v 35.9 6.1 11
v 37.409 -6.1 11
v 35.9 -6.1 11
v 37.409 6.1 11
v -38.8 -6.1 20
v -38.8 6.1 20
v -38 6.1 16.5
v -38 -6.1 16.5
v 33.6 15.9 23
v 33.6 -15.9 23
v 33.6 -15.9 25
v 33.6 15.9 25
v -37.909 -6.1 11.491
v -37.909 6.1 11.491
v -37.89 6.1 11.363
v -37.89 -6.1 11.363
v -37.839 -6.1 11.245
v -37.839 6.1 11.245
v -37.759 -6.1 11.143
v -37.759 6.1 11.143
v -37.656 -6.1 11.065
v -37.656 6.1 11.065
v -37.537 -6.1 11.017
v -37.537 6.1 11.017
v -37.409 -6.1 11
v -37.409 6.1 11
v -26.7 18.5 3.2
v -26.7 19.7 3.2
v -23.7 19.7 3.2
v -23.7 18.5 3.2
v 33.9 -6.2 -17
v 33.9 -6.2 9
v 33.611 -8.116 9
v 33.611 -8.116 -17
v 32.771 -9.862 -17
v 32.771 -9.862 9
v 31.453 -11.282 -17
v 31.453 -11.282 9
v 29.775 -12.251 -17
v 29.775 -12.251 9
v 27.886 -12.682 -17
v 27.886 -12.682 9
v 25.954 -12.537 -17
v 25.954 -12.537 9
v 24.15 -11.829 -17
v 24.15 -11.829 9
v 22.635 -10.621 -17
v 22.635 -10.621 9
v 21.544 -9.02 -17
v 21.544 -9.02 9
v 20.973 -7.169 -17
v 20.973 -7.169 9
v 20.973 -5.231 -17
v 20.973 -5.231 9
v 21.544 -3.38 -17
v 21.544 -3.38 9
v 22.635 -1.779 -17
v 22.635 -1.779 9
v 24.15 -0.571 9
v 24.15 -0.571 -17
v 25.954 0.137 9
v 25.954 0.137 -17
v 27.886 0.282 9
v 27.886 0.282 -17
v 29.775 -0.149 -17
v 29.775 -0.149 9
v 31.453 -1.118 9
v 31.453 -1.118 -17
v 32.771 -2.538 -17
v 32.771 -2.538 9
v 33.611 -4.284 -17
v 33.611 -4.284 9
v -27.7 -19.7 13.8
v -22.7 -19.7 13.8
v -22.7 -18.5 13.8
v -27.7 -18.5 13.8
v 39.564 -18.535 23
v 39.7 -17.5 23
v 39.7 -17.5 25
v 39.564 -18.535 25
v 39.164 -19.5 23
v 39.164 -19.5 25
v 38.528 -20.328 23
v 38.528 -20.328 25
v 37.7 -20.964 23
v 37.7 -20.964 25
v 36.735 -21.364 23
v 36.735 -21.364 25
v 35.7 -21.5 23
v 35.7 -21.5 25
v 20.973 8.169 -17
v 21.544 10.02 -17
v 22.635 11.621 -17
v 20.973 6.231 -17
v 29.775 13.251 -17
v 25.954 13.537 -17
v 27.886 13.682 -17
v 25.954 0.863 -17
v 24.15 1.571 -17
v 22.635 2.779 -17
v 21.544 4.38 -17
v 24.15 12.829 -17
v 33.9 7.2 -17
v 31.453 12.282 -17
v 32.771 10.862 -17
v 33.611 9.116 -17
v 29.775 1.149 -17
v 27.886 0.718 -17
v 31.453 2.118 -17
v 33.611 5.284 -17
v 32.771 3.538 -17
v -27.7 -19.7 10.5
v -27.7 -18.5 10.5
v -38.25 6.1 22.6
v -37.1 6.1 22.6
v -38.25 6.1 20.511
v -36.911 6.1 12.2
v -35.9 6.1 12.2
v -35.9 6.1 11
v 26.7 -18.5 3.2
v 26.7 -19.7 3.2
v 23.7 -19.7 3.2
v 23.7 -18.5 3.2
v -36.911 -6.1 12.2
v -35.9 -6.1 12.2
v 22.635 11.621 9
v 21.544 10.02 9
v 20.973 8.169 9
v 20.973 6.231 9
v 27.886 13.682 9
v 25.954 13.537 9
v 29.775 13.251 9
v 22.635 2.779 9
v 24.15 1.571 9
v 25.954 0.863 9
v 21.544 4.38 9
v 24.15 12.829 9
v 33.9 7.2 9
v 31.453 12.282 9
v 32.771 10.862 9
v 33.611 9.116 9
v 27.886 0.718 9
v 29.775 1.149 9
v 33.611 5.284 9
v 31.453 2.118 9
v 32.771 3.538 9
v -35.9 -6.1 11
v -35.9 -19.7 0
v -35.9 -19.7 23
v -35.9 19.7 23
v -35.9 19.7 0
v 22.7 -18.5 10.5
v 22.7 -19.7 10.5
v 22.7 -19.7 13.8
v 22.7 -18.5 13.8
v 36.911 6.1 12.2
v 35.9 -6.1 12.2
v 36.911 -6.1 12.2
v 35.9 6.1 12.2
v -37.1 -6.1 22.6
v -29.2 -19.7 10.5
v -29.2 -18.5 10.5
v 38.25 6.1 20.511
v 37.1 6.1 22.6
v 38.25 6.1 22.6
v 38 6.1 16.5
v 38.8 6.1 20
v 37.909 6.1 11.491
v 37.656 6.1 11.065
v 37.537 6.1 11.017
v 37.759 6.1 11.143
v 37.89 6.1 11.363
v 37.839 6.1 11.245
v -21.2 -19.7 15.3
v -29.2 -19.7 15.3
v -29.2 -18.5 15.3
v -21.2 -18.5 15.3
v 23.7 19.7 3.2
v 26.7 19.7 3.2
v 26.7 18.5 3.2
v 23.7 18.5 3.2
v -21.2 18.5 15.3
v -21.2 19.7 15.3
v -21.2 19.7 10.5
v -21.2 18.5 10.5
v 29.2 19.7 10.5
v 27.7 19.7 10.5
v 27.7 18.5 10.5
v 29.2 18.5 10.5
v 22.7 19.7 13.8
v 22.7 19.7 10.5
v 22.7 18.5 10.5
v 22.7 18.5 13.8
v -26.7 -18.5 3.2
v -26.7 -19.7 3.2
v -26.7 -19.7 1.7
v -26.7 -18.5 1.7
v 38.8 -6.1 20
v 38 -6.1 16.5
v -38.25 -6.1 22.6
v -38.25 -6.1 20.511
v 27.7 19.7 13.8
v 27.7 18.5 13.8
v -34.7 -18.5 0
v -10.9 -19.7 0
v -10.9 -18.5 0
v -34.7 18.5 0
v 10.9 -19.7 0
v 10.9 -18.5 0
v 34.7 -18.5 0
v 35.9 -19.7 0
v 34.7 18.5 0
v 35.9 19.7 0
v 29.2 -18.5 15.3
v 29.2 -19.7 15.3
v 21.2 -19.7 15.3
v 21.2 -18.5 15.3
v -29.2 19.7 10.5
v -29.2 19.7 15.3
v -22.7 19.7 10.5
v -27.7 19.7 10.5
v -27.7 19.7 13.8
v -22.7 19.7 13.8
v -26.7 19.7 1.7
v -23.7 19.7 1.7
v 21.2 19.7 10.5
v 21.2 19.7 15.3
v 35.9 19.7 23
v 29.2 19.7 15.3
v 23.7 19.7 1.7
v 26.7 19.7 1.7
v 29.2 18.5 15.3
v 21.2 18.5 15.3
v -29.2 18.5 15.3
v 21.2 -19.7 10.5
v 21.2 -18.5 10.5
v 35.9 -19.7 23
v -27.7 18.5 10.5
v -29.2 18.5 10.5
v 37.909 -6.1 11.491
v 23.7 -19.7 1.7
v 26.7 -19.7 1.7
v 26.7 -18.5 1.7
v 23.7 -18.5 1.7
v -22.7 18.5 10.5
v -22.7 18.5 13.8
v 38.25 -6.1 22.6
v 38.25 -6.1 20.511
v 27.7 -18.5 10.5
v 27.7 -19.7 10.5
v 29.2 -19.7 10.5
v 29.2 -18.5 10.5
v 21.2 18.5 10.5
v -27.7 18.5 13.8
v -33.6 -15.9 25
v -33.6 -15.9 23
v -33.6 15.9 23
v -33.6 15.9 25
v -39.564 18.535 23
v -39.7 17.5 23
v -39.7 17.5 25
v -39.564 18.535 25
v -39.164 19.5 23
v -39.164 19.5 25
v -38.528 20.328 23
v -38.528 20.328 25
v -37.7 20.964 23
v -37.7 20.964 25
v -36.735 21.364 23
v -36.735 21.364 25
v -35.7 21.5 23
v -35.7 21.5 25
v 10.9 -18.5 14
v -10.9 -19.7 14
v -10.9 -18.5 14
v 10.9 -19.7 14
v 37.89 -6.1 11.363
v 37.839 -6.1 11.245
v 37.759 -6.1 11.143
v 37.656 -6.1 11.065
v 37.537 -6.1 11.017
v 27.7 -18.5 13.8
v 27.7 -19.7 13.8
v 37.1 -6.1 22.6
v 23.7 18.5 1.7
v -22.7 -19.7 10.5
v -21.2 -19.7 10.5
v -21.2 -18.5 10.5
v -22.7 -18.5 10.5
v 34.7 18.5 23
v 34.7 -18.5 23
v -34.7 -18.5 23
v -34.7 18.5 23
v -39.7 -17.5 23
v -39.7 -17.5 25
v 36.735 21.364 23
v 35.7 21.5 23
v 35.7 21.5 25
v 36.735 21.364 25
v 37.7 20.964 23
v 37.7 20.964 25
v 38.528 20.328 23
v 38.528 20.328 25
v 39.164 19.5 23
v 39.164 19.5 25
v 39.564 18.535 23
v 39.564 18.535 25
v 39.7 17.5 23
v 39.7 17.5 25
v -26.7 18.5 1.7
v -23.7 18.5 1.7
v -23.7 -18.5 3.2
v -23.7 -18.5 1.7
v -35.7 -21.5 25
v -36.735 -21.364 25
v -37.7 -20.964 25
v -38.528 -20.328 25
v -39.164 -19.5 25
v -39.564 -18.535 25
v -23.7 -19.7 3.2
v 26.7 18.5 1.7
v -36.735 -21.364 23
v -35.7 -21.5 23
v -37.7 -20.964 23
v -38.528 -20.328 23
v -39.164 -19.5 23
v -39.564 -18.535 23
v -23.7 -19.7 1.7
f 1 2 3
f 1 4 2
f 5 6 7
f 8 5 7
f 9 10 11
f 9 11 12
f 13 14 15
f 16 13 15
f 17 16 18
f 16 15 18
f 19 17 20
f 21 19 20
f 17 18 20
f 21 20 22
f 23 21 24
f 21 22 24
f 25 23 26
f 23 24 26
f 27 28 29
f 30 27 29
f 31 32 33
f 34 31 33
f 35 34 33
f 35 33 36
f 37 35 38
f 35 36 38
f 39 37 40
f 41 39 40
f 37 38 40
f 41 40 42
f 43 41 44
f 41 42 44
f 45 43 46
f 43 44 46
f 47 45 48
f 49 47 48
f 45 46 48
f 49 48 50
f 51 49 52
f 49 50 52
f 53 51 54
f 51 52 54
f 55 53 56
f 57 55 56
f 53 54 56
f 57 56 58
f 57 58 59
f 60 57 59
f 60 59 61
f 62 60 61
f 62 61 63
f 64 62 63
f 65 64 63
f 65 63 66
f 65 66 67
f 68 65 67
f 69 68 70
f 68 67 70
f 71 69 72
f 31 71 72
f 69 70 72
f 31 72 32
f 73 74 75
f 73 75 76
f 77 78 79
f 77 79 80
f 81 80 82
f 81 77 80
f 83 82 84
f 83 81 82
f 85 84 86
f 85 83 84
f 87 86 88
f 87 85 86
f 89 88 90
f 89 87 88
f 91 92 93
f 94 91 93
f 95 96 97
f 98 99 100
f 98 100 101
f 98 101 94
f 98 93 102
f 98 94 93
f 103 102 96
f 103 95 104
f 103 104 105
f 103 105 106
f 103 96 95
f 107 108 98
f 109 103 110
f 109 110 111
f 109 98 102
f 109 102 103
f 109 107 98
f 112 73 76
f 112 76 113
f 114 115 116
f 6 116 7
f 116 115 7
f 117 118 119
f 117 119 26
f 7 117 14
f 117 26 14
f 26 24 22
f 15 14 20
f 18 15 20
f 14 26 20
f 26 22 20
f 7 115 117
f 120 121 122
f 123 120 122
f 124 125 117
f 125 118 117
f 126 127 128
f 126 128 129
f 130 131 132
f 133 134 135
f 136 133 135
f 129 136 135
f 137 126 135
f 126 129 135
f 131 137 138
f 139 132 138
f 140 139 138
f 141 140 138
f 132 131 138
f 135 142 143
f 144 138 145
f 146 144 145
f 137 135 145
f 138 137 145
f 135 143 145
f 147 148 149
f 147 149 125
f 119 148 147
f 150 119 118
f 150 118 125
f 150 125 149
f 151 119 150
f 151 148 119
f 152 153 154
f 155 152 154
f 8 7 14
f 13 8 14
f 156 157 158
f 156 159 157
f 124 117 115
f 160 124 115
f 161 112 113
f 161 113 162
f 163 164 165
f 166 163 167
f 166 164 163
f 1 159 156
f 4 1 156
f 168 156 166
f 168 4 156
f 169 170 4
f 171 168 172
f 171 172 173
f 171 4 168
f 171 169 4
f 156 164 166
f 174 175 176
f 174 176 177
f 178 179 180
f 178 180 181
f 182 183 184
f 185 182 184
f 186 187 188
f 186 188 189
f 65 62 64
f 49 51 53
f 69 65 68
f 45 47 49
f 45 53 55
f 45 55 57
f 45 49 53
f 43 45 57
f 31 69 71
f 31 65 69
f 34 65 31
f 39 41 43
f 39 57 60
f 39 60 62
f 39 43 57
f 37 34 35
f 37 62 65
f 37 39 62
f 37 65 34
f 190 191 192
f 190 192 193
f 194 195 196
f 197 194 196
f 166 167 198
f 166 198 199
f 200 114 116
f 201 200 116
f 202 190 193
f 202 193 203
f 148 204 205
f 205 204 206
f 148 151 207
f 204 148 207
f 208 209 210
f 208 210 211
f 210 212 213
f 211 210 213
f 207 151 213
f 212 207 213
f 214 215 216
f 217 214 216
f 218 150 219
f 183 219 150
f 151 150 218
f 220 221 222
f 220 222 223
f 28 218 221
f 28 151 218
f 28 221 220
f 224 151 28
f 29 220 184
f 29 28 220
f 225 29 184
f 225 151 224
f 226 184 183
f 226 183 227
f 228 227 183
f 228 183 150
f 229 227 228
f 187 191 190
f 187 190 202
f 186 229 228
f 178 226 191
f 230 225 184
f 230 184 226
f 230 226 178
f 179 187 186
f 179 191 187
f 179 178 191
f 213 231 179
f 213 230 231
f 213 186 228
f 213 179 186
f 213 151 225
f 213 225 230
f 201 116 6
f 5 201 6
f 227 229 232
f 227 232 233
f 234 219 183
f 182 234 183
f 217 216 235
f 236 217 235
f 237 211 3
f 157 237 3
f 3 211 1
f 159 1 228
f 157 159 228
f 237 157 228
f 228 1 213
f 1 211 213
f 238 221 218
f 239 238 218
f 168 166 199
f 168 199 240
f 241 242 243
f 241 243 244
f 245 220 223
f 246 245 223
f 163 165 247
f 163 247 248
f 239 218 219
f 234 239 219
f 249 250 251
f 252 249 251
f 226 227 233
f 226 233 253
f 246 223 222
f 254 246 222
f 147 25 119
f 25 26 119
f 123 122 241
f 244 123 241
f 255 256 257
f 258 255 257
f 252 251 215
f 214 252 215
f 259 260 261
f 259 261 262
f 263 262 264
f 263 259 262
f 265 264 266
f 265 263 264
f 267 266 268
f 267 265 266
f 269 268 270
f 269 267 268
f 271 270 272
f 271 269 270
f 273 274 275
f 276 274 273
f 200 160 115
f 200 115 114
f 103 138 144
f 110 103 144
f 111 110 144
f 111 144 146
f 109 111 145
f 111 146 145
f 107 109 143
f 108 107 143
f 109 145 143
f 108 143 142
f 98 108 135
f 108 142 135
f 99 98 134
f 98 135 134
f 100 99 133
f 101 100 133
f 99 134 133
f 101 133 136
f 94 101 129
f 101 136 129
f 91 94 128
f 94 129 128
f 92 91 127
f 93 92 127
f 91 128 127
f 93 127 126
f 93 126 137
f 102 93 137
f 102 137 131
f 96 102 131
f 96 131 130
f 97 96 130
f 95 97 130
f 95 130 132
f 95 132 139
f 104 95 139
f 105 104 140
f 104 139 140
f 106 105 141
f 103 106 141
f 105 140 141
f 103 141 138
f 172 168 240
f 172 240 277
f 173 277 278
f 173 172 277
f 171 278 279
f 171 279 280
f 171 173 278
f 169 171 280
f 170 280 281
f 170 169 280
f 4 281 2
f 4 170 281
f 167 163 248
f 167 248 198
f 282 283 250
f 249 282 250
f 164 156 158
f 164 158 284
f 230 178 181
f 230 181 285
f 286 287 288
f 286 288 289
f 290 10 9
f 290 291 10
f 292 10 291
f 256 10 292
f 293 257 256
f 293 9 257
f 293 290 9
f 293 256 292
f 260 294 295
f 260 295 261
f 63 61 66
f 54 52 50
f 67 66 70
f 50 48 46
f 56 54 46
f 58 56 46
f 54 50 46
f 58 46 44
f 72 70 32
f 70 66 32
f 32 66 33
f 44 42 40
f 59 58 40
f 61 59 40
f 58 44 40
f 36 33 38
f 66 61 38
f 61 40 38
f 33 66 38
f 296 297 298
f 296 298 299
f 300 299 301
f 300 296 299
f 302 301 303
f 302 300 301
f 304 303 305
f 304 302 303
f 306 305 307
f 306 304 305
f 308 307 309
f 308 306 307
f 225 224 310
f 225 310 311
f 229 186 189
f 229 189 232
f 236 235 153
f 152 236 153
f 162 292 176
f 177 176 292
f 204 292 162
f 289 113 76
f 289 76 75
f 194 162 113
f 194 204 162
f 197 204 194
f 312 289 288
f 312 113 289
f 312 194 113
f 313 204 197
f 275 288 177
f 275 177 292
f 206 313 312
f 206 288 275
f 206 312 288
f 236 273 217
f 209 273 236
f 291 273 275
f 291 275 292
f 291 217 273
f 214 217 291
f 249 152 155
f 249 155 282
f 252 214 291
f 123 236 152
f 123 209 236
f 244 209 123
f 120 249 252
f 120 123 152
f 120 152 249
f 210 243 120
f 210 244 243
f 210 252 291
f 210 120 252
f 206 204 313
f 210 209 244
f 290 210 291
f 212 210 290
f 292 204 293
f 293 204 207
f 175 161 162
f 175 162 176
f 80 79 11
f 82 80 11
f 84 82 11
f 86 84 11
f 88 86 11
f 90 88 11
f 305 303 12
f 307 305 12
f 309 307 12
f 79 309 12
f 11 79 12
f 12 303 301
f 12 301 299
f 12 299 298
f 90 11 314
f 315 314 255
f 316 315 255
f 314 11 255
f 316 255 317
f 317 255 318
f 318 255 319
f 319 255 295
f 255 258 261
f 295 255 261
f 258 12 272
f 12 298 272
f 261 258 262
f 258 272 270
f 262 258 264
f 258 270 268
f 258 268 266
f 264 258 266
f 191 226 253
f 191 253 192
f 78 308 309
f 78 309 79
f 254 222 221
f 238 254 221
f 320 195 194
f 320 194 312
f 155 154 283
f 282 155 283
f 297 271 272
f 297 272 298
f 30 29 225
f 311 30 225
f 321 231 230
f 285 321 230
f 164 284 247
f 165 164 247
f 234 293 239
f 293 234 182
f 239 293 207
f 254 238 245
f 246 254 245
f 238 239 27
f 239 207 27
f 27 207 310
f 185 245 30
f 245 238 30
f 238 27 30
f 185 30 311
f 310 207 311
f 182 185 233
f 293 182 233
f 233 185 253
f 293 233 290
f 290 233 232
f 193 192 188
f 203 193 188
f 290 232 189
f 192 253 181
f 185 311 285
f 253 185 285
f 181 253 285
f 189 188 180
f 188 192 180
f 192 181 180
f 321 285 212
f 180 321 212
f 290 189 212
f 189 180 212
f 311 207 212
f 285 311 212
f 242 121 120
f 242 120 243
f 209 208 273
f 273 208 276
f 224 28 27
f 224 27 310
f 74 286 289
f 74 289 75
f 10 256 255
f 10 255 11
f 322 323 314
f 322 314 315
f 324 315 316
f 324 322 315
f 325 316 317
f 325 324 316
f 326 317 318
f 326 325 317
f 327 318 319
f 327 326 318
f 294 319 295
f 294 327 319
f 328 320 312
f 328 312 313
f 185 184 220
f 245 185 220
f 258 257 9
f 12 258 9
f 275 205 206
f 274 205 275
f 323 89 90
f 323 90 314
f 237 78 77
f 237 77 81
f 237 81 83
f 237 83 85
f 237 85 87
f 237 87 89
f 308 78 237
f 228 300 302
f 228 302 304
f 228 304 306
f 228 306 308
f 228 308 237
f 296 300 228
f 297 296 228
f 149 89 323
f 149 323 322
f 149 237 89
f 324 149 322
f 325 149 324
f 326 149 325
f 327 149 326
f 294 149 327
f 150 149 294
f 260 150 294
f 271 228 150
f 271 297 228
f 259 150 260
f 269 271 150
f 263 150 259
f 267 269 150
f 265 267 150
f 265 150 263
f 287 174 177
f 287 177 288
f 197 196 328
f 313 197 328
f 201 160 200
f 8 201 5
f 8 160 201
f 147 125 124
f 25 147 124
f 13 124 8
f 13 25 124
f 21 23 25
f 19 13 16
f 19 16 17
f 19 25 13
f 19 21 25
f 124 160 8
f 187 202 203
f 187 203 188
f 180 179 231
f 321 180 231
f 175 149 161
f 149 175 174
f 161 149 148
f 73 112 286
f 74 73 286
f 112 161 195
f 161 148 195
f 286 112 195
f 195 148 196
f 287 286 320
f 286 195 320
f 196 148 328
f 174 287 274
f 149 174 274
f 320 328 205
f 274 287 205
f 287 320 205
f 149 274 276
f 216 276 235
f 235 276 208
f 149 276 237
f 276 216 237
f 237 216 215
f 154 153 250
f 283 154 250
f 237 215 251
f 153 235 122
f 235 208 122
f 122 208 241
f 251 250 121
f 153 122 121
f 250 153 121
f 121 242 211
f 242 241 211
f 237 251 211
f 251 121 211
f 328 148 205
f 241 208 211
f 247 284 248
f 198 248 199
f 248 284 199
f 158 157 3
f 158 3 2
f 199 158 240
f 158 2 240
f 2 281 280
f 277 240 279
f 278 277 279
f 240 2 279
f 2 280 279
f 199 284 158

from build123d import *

# Parameters (mm, degrees)
SKETCH_1_W               = 71.8
SKETCH_1_H               = 39.4
SKETCH_1_W_2             = 69.4
SKETCH_1_H_2             = 37
EXTRUDE_1_DEPTH          = 23
SKETCH_2_W               = 67.2
SKETCH_2_H               = 31.8
EXTRUDE_2_DEPTH          = 2
EXTRUDE_3_DEPTH          = 6.1
CUT_EXTRUDE_1_REACH      = 64.438
SKETCH_4_W               = 21.8
SKETCH_4_H               = 14
CUT_EXTRUDE_2_REACH      = 64.438
SKETCH_5_W               = 3
SKETCH_5_H               = 1.5
MIRROR_3_COPY_1_REACH    = 64.438
MIRROR_3_COPY_1_SKETCH_W = 3
MIRROR_3_COPY_1_SKETCH_H = 1.5
SKETCH_6_R               = 6.5
EXTRUDE_4_DEPTH          = 26
EXTRUDE_4_2_DEPTH        = 26


with BuildPart() as part:
    # Эскиз1 → Бобышка-Вытянуть1 (new body)
    with BuildSketch(Plane.XY):
        Rectangle(SKETCH_1_W, SKETCH_1_H)
        Rectangle(SKETCH_1_W_2, SKETCH_1_H_2, mode=Mode.SUBTRACT)
    extrude(amount=EXTRUDE_1_DEPTH)

    # Эскиз2 → Бобышка-Вытянуть2 (add)
    with BuildSketch(Plane.XY.offset(23)):
        with BuildLine():
            Line((-35.7, 21.5), (35.7, 21.5))
            ThreePointArc((35.7, 21.5), (38.528427125, 20.328427125), (39.7, 17.5))
            Line((39.7, 17.5), (39.7, -17.5))
            ThreePointArc((39.7, -17.5), (38.528427125, -20.328427125), (35.7, -21.5))
            Line((35.7, -21.5), (-35.7, -21.5))
            ThreePointArc((-35.7, -21.5), (-38.528427125, -20.328427125), (-39.7, -17.5))
            Line((-39.7, -17.5), (-39.7, 17.5))
            ThreePointArc((-39.7, 17.5), (-38.528427125, 20.328427125), (-35.7, 21.5))
        make_face()
        Rectangle(SKETCH_2_W, SKETCH_2_H, mode=Mode.SUBTRACT)
    extrude(amount=EXTRUDE_2_DEPTH)

    # Эскиз3 → Бобышка-Вытянуть3 (add, symmetric)
    with BuildSketch(Plane(origin=(0, 0, 0), x_dir=(1, 0, 0), z_dir=(0, 1, 0))):
        with BuildLine():
            Line((35.9, -12.2), (36.910909091, -12.2))
            Line((36.910909091, -12.2), (37.1, -22.6))
            Line((37.1, -22.6), (38.25, -22.6))
            Line((38.25, -22.6), (38.25, -20.510644536))
            Line((38.25, -20.510644536), (38.8, -20))
            Line((38.8, -20), (38, -16.5))
            Line((38, -16.5), (37.908925647, -11.490910593))
            ThreePointArc((37.908925647, -11.490910593), (37.759333332, -11.143247492), (37.409008271, -11))
            Line((37.409008271, -11), (35.9, -11))
            Line((35.9, -11), (35.9, -12.2))
        make_face()
    extrude_3 = extrude(amount=EXTRUDE_3_DEPTH, both=True)

    # Зеркальное отражение1: Бобышка-Вытянуть3 across plane
    add(extrude_3.mirror(Plane(origin=(0, 0, 0), x_dir=(0, 0, 1), z_dir=(1, 0, 0))))

    # Эскиз4 → Вырез-Вытянуть1 (cut, up to next)
    with BuildSketch(Plane.XZ.offset(19.7), mode=Mode.PRIVATE) as cut_extrude_1_sk1:
        with Locations((0, 7)):
            Rectangle(SKETCH_4_W, SKETCH_4_H)
    cut_extrude_1_tool1 = extrude(cut_extrude_1_sk1.sketch, amount=-CUT_EXTRUDE_1_REACH, mode=Mode.PRIVATE) & part.part
    add(cut_extrude_1_tool1.solids().sort_by_distance((0, -19.7, 7))[0], mode=Mode.SUBTRACT)

    # Эскиз5 → Вырез-Вытянуть2 (cut, up to next)
    with BuildSketch(Plane(origin=(0, 19.7, 0), x_dir=(1, 0, 0), z_dir=(0, 1, 0)), mode=Mode.PRIVATE) as cut_extrude_2_sk1:
        Polygon((-29.2, -10.5), (-29.2, -15.3), (-21.2, -15.3), (-21.2, -10.5), (-22.7, -10.5), (-22.7, -13.8), (-27.7, -13.8), (-27.7, -10.5), align=None)
    cut_extrude_2_tool1 = extrude(cut_extrude_2_sk1.sketch, amount=-CUT_EXTRUDE_2_REACH, mode=Mode.PRIVATE) & part.part
    # Эскиз5 → Вырез-Вытянуть2 (cut, up to next)
    with BuildSketch(Plane(origin=(0, 19.7, 0), x_dir=(1, 0, 0), z_dir=(0, 1, 0)), mode=Mode.PRIVATE) as cut_extrude_2_sk2:
        with Locations((-25.2, -2.45)):
            Rectangle(SKETCH_5_W, SKETCH_5_H)
    cut_extrude_2_tool2 = extrude(cut_extrude_2_sk2.sketch, amount=-CUT_EXTRUDE_2_REACH, mode=Mode.PRIVATE) & part.part
    cut_extrude_2_1 = cut_extrude_2_tool1.solids().sort_by_distance((-29.106705, 19.7, 12.9))[0]
    add(cut_extrude_2_1, mode=Mode.SUBTRACT)
    cut_extrude_2_2 = cut_extrude_2_tool2.solids().sort_by_distance((-25.2, 19.7, 2.45))[0]
    add(cut_extrude_2_2, mode=Mode.SUBTRACT)
    cut_extrude_2 = cut_extrude_2_1 + cut_extrude_2_2  # Вырез-Вытянуть2 as one shape, for the pattern or mirror that repeats it

    # Зеркальное отражение2: Вырез-Вытянуть2 across plane
    add(cut_extrude_2.mirror(Plane(origin=(0, 0, 0), x_dir=(0, 0, 1), z_dir=(1, 0, 0))), mode=Mode.SUBTRACT)

    # Зеркальное отражение3: Вырез-Вытянуть2 across plane
    add(cut_extrude_2.mirror(Plane.ZX), mode=Mode.SUBTRACT)

    # Зеркальное отражение3 copy 1 sketch → Зеркальное отражение3 copy 1 (cut, up to next)
    with BuildSketch(Plane(origin=(0, -19.7, 0), x_dir=(-1, 0, 0), z_dir=(0, -1, 0)), mode=Mode.PRIVATE) as mirror_3_copy_1_sk1:
        Polygon((-29.2, -10.5), (-29.2, -15.3), (-21.2, -15.3), (-21.2, -10.5), (-22.7, -10.5), (-22.7, -13.8), (-27.7, -13.8), (-27.7, -10.5), align=None)
    mirror_3_copy_1_tool1 = extrude(mirror_3_copy_1_sk1.sketch, amount=-MIRROR_3_COPY_1_REACH, mode=Mode.PRIVATE) & part.part
    # Зеркальное отражение3 copy 1 sketch → Зеркальное отражение3 copy 1 (cut, up to next)
    with BuildSketch(Plane(origin=(0, -19.7, 0), x_dir=(-1, 0, 0), z_dir=(0, -1, 0)), mode=Mode.PRIVATE) as mirror_3_copy_1_sk2:
        with Locations((-25.2, -2.45)):
            Rectangle(MIRROR_3_COPY_1_SKETCH_W, MIRROR_3_COPY_1_SKETCH_H)
    mirror_3_copy_1_tool2 = extrude(mirror_3_copy_1_sk2.sketch, amount=-MIRROR_3_COPY_1_REACH, mode=Mode.PRIVATE) & part.part
    add(mirror_3_copy_1_tool1.solids().sort_by_distance((29.106705, -19.7, 12.9))[0], mode=Mode.SUBTRACT)
    add(mirror_3_copy_1_tool2.solids().sort_by_distance((25.2, -19.7, 2.45))[0], mode=Mode.SUBTRACT)


with BuildPart() as body_2:
    # Эскиз6 → Бобышка-Вытянуть4 (new body)
    with BuildSketch(Plane(origin=(0, 0, 9), x_dir=(-1, 0, 0), z_dir=(0, 0, -1))):
        with Locations(Location((-27.4, 7.2, 0), (0, 0, 180))):
            Circle(SKETCH_6_R)
    extrude(amount=EXTRUDE_4_DEPTH)


with BuildPart() as body_3:
    # Эскиз6 → Extrude 4 2 (new body)
    with BuildSketch(Plane(origin=(0, 0, 9), x_dir=(-1, 0, 0), z_dir=(0, 0, -1))):
        with Locations(Location((-27.4, -6.2, 0), (0, 0, 180))):
            Circle(SKETCH_6_R)
    extrude(amount=EXTRUDE_4_2_DEPTH)


solid = Compound([part.part, body_2.part, body_3.part])
